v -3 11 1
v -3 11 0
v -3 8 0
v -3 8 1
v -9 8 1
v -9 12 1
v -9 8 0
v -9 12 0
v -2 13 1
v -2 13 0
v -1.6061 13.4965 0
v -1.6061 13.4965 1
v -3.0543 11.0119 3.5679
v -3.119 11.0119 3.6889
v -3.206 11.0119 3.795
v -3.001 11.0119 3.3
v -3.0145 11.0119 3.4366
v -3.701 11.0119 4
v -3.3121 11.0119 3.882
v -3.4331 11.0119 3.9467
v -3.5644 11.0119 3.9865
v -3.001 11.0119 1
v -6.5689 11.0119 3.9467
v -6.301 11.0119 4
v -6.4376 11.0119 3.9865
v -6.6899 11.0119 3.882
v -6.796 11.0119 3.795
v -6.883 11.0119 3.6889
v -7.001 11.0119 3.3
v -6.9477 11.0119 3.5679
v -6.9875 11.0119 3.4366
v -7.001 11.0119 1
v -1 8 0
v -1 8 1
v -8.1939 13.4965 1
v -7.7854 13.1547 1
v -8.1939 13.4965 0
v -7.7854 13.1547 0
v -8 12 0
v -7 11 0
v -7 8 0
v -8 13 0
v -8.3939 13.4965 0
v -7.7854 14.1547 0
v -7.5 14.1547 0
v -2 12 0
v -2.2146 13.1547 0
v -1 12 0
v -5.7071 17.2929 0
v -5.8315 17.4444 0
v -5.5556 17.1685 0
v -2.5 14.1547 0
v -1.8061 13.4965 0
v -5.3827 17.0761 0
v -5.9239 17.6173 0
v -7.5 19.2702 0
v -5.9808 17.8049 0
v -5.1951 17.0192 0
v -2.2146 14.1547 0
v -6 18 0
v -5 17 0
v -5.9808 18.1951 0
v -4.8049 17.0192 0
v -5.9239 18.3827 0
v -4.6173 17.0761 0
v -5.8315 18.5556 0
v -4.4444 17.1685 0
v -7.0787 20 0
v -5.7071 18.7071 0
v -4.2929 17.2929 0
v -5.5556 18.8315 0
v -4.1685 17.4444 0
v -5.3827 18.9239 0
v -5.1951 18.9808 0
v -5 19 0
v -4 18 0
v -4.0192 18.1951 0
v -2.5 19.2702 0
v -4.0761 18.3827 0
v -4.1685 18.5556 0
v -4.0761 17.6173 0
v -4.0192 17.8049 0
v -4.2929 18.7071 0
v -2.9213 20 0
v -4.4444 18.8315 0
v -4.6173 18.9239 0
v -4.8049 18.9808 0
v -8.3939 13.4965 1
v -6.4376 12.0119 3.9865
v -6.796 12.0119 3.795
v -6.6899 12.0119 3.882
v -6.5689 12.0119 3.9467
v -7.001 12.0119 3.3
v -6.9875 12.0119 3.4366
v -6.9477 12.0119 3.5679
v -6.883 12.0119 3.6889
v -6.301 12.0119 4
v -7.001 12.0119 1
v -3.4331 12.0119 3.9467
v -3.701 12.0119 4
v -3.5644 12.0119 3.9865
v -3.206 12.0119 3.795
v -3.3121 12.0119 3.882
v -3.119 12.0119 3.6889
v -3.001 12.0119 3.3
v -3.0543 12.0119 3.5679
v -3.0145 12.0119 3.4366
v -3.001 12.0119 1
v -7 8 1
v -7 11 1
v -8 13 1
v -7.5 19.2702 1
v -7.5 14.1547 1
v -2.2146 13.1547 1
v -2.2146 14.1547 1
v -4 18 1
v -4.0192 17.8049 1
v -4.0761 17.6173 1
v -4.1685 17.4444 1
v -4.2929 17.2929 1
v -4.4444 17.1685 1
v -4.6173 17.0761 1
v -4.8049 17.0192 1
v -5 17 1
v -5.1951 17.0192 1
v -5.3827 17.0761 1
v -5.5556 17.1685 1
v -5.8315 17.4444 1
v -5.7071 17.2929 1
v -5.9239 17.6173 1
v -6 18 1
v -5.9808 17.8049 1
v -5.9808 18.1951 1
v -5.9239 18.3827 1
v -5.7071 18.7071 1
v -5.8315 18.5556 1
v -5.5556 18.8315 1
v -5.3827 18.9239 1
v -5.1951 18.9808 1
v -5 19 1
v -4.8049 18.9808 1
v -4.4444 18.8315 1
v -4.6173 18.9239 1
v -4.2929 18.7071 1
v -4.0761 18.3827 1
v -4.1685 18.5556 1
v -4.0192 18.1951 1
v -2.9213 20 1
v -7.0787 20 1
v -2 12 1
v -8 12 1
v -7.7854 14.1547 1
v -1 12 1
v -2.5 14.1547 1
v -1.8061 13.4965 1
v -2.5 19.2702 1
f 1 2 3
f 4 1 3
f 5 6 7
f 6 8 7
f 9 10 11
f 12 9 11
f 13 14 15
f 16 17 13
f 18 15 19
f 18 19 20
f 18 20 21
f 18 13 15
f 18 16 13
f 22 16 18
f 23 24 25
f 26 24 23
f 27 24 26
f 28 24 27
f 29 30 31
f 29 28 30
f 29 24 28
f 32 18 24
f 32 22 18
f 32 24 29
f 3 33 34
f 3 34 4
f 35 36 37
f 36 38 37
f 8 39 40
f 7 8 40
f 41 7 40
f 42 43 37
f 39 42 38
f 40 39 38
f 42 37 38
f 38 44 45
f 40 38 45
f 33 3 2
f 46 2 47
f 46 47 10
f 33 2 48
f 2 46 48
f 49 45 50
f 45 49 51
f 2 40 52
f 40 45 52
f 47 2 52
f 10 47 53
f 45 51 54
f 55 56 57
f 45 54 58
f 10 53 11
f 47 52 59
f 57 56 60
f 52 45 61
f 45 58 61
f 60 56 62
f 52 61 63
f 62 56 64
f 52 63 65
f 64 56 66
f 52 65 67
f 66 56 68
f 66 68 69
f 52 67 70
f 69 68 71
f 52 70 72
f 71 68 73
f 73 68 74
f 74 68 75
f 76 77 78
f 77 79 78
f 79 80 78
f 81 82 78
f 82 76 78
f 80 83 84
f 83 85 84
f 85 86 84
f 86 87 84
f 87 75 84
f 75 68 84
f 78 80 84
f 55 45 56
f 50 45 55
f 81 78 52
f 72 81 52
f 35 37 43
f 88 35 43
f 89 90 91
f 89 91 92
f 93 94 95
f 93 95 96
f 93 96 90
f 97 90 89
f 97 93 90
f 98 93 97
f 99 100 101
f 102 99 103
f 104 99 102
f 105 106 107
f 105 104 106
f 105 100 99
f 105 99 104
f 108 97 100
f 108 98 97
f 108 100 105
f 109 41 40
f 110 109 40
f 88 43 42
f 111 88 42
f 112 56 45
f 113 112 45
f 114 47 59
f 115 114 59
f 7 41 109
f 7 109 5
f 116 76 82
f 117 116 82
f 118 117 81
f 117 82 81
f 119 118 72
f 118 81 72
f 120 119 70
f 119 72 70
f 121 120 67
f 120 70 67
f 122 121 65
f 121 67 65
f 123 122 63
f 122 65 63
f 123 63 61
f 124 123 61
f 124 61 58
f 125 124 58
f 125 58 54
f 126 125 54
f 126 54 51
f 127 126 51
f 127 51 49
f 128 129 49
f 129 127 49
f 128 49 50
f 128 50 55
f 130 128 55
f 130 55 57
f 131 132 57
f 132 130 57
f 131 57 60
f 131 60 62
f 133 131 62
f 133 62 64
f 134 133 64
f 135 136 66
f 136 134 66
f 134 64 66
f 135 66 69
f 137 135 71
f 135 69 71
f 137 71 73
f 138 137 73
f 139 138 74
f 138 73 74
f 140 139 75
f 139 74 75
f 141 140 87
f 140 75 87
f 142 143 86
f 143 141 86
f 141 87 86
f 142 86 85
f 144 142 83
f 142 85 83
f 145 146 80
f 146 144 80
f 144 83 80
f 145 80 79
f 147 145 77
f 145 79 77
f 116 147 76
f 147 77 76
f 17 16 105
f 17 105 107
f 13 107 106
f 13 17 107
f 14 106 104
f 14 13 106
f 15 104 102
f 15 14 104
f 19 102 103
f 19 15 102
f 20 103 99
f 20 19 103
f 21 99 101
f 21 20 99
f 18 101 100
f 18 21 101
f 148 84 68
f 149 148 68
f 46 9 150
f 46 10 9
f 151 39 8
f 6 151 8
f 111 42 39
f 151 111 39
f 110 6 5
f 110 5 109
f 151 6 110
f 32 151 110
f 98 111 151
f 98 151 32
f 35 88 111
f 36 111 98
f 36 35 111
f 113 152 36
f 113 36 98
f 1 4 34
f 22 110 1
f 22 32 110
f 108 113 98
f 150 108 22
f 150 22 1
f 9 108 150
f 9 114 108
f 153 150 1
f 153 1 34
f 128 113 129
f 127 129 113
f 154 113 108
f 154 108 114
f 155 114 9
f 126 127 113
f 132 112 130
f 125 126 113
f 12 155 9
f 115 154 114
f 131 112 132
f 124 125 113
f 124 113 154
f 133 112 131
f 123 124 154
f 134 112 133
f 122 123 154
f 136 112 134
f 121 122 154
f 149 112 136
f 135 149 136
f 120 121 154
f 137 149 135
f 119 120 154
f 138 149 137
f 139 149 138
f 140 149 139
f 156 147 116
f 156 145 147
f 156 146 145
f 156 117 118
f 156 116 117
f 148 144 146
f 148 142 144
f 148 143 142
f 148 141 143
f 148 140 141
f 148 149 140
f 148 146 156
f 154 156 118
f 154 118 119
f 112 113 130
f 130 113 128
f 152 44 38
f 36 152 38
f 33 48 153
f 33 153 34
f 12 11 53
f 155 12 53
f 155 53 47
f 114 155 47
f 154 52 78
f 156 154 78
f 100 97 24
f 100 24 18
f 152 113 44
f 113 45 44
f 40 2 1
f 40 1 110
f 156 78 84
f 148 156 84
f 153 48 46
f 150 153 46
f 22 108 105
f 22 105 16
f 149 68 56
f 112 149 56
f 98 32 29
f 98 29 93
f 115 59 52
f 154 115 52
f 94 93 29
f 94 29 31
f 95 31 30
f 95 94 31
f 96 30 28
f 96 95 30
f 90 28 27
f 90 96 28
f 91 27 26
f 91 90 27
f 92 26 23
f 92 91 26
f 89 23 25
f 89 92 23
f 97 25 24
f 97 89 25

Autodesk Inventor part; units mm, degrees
ref_plane "YZ Plane" through (0, 0, 0) normal (1, 0, 0) x (0, 1, 0)
ref_plane "XZ Plane" through (0, 0, 0) normal (0, 1, 0) x (-1, 0, 0)
ref_plane "XY Plane" through (0, 0, 0) normal (0, 0, 1) x (1, 0, 0)
sketch "Boceto1" plane through (0, 0, 0) normal (0, 0, 1) x (1, 0, 0)
  circle A0 centre (-5, 18) radius 1 projected
  line L0 (-8.3939, 13.4965) -> (-8, 13) projected
  line L1 (-8, 13) -> (-8, 12) projected
  line L2 (-2, 13) -> (-2, 12) projected
  line L3 (-2, 13) -> (-1.6061, 13.4965) projected
  line L4 (-1.6061, 13.4965) -> (-1.8061, 13.4965) projected
  line L5 (-1.8061, 13.4965) -> (-2.2146, 13.1547) projected
  line L6 (-2.2146, 13.1547) -> (-2.2146, 14.1547) projected
  line L7 (-2.2146, 14.1547) -> (-2.5, 14.1547) projected
  line L8 (-2.5, 14.1547) -> (-2.5, 19.2702) projected
  line L9 (-2.5, 19.2702) -> (-2.9213, 20) projected
  line L10 (-2.9213, 20) -> (-7.0787, 20) projected
  line L11 (-7.0787, 20) -> (-7.5, 19.2702) projected
  line L12 (-7.5, 19.2702) -> (-7.5, 14.1547) projected
  line L13 (-7.5, 14.1547) -> (-7.7854, 14.1547) projected
  line L14 (-7.7854, 14.1547) -> (-7.7854, 13.1547) projected
  line L15 (-7.7854, 13.1547) -> (-8.1939, 13.4965) projected
  line L16 (-8.1939, 13.4965) -> (-8.3939, 13.4965) projected
  line L17 (-8, 12) -> (-9, 12) projected
  line L18 (-9, 12) -> (-9, 8) projected
  line L19 (-7, 8) -> (-9, 8) projected
  line L20 (-7, 8) -> (-7, 11) projected
  line L21 (-3, 11) -> (-3, 8) projected
  line L22 (-1, 8) -> (-3, 8) projected
  line L23 (-1, 12) -> (-1, 8) projected
  line L24 (-1, 12) -> (-2, 12) projected
  line L25 (-3, 11) -> (-7, 11) projected
  point P0 (0, 0)
extrude "Extrusión1" add sketch "Boceto1" along normal blind 1
sketch "Boceto8" plane through (0, 0, 1) normal (0, 0, 1) x (1, 0, 0)
  line L0 (-3.001, 11.0119) -> (-7.001, 11.0119)
  line L1 (-7.001, 11.0119) -> (-7.001, 12.0119)
  line L2 (-7.001, 12.0119) -> (-3.001, 12.0119)
  line L3 (-3.001, 12.0119) -> (-3.001, 11.0119)
  point P0 (0, 0)
  dimension "d24" = 4
  dimension "d25" = 1
extrude "Extrusión4" add sketch "Boceto8" along normal blind 3
fillet "Empalme5" radius 0.7 2 edges at (-7.001, 11.5119, 4) (-3.001, 11.5119, 4)
properties material "----------"
